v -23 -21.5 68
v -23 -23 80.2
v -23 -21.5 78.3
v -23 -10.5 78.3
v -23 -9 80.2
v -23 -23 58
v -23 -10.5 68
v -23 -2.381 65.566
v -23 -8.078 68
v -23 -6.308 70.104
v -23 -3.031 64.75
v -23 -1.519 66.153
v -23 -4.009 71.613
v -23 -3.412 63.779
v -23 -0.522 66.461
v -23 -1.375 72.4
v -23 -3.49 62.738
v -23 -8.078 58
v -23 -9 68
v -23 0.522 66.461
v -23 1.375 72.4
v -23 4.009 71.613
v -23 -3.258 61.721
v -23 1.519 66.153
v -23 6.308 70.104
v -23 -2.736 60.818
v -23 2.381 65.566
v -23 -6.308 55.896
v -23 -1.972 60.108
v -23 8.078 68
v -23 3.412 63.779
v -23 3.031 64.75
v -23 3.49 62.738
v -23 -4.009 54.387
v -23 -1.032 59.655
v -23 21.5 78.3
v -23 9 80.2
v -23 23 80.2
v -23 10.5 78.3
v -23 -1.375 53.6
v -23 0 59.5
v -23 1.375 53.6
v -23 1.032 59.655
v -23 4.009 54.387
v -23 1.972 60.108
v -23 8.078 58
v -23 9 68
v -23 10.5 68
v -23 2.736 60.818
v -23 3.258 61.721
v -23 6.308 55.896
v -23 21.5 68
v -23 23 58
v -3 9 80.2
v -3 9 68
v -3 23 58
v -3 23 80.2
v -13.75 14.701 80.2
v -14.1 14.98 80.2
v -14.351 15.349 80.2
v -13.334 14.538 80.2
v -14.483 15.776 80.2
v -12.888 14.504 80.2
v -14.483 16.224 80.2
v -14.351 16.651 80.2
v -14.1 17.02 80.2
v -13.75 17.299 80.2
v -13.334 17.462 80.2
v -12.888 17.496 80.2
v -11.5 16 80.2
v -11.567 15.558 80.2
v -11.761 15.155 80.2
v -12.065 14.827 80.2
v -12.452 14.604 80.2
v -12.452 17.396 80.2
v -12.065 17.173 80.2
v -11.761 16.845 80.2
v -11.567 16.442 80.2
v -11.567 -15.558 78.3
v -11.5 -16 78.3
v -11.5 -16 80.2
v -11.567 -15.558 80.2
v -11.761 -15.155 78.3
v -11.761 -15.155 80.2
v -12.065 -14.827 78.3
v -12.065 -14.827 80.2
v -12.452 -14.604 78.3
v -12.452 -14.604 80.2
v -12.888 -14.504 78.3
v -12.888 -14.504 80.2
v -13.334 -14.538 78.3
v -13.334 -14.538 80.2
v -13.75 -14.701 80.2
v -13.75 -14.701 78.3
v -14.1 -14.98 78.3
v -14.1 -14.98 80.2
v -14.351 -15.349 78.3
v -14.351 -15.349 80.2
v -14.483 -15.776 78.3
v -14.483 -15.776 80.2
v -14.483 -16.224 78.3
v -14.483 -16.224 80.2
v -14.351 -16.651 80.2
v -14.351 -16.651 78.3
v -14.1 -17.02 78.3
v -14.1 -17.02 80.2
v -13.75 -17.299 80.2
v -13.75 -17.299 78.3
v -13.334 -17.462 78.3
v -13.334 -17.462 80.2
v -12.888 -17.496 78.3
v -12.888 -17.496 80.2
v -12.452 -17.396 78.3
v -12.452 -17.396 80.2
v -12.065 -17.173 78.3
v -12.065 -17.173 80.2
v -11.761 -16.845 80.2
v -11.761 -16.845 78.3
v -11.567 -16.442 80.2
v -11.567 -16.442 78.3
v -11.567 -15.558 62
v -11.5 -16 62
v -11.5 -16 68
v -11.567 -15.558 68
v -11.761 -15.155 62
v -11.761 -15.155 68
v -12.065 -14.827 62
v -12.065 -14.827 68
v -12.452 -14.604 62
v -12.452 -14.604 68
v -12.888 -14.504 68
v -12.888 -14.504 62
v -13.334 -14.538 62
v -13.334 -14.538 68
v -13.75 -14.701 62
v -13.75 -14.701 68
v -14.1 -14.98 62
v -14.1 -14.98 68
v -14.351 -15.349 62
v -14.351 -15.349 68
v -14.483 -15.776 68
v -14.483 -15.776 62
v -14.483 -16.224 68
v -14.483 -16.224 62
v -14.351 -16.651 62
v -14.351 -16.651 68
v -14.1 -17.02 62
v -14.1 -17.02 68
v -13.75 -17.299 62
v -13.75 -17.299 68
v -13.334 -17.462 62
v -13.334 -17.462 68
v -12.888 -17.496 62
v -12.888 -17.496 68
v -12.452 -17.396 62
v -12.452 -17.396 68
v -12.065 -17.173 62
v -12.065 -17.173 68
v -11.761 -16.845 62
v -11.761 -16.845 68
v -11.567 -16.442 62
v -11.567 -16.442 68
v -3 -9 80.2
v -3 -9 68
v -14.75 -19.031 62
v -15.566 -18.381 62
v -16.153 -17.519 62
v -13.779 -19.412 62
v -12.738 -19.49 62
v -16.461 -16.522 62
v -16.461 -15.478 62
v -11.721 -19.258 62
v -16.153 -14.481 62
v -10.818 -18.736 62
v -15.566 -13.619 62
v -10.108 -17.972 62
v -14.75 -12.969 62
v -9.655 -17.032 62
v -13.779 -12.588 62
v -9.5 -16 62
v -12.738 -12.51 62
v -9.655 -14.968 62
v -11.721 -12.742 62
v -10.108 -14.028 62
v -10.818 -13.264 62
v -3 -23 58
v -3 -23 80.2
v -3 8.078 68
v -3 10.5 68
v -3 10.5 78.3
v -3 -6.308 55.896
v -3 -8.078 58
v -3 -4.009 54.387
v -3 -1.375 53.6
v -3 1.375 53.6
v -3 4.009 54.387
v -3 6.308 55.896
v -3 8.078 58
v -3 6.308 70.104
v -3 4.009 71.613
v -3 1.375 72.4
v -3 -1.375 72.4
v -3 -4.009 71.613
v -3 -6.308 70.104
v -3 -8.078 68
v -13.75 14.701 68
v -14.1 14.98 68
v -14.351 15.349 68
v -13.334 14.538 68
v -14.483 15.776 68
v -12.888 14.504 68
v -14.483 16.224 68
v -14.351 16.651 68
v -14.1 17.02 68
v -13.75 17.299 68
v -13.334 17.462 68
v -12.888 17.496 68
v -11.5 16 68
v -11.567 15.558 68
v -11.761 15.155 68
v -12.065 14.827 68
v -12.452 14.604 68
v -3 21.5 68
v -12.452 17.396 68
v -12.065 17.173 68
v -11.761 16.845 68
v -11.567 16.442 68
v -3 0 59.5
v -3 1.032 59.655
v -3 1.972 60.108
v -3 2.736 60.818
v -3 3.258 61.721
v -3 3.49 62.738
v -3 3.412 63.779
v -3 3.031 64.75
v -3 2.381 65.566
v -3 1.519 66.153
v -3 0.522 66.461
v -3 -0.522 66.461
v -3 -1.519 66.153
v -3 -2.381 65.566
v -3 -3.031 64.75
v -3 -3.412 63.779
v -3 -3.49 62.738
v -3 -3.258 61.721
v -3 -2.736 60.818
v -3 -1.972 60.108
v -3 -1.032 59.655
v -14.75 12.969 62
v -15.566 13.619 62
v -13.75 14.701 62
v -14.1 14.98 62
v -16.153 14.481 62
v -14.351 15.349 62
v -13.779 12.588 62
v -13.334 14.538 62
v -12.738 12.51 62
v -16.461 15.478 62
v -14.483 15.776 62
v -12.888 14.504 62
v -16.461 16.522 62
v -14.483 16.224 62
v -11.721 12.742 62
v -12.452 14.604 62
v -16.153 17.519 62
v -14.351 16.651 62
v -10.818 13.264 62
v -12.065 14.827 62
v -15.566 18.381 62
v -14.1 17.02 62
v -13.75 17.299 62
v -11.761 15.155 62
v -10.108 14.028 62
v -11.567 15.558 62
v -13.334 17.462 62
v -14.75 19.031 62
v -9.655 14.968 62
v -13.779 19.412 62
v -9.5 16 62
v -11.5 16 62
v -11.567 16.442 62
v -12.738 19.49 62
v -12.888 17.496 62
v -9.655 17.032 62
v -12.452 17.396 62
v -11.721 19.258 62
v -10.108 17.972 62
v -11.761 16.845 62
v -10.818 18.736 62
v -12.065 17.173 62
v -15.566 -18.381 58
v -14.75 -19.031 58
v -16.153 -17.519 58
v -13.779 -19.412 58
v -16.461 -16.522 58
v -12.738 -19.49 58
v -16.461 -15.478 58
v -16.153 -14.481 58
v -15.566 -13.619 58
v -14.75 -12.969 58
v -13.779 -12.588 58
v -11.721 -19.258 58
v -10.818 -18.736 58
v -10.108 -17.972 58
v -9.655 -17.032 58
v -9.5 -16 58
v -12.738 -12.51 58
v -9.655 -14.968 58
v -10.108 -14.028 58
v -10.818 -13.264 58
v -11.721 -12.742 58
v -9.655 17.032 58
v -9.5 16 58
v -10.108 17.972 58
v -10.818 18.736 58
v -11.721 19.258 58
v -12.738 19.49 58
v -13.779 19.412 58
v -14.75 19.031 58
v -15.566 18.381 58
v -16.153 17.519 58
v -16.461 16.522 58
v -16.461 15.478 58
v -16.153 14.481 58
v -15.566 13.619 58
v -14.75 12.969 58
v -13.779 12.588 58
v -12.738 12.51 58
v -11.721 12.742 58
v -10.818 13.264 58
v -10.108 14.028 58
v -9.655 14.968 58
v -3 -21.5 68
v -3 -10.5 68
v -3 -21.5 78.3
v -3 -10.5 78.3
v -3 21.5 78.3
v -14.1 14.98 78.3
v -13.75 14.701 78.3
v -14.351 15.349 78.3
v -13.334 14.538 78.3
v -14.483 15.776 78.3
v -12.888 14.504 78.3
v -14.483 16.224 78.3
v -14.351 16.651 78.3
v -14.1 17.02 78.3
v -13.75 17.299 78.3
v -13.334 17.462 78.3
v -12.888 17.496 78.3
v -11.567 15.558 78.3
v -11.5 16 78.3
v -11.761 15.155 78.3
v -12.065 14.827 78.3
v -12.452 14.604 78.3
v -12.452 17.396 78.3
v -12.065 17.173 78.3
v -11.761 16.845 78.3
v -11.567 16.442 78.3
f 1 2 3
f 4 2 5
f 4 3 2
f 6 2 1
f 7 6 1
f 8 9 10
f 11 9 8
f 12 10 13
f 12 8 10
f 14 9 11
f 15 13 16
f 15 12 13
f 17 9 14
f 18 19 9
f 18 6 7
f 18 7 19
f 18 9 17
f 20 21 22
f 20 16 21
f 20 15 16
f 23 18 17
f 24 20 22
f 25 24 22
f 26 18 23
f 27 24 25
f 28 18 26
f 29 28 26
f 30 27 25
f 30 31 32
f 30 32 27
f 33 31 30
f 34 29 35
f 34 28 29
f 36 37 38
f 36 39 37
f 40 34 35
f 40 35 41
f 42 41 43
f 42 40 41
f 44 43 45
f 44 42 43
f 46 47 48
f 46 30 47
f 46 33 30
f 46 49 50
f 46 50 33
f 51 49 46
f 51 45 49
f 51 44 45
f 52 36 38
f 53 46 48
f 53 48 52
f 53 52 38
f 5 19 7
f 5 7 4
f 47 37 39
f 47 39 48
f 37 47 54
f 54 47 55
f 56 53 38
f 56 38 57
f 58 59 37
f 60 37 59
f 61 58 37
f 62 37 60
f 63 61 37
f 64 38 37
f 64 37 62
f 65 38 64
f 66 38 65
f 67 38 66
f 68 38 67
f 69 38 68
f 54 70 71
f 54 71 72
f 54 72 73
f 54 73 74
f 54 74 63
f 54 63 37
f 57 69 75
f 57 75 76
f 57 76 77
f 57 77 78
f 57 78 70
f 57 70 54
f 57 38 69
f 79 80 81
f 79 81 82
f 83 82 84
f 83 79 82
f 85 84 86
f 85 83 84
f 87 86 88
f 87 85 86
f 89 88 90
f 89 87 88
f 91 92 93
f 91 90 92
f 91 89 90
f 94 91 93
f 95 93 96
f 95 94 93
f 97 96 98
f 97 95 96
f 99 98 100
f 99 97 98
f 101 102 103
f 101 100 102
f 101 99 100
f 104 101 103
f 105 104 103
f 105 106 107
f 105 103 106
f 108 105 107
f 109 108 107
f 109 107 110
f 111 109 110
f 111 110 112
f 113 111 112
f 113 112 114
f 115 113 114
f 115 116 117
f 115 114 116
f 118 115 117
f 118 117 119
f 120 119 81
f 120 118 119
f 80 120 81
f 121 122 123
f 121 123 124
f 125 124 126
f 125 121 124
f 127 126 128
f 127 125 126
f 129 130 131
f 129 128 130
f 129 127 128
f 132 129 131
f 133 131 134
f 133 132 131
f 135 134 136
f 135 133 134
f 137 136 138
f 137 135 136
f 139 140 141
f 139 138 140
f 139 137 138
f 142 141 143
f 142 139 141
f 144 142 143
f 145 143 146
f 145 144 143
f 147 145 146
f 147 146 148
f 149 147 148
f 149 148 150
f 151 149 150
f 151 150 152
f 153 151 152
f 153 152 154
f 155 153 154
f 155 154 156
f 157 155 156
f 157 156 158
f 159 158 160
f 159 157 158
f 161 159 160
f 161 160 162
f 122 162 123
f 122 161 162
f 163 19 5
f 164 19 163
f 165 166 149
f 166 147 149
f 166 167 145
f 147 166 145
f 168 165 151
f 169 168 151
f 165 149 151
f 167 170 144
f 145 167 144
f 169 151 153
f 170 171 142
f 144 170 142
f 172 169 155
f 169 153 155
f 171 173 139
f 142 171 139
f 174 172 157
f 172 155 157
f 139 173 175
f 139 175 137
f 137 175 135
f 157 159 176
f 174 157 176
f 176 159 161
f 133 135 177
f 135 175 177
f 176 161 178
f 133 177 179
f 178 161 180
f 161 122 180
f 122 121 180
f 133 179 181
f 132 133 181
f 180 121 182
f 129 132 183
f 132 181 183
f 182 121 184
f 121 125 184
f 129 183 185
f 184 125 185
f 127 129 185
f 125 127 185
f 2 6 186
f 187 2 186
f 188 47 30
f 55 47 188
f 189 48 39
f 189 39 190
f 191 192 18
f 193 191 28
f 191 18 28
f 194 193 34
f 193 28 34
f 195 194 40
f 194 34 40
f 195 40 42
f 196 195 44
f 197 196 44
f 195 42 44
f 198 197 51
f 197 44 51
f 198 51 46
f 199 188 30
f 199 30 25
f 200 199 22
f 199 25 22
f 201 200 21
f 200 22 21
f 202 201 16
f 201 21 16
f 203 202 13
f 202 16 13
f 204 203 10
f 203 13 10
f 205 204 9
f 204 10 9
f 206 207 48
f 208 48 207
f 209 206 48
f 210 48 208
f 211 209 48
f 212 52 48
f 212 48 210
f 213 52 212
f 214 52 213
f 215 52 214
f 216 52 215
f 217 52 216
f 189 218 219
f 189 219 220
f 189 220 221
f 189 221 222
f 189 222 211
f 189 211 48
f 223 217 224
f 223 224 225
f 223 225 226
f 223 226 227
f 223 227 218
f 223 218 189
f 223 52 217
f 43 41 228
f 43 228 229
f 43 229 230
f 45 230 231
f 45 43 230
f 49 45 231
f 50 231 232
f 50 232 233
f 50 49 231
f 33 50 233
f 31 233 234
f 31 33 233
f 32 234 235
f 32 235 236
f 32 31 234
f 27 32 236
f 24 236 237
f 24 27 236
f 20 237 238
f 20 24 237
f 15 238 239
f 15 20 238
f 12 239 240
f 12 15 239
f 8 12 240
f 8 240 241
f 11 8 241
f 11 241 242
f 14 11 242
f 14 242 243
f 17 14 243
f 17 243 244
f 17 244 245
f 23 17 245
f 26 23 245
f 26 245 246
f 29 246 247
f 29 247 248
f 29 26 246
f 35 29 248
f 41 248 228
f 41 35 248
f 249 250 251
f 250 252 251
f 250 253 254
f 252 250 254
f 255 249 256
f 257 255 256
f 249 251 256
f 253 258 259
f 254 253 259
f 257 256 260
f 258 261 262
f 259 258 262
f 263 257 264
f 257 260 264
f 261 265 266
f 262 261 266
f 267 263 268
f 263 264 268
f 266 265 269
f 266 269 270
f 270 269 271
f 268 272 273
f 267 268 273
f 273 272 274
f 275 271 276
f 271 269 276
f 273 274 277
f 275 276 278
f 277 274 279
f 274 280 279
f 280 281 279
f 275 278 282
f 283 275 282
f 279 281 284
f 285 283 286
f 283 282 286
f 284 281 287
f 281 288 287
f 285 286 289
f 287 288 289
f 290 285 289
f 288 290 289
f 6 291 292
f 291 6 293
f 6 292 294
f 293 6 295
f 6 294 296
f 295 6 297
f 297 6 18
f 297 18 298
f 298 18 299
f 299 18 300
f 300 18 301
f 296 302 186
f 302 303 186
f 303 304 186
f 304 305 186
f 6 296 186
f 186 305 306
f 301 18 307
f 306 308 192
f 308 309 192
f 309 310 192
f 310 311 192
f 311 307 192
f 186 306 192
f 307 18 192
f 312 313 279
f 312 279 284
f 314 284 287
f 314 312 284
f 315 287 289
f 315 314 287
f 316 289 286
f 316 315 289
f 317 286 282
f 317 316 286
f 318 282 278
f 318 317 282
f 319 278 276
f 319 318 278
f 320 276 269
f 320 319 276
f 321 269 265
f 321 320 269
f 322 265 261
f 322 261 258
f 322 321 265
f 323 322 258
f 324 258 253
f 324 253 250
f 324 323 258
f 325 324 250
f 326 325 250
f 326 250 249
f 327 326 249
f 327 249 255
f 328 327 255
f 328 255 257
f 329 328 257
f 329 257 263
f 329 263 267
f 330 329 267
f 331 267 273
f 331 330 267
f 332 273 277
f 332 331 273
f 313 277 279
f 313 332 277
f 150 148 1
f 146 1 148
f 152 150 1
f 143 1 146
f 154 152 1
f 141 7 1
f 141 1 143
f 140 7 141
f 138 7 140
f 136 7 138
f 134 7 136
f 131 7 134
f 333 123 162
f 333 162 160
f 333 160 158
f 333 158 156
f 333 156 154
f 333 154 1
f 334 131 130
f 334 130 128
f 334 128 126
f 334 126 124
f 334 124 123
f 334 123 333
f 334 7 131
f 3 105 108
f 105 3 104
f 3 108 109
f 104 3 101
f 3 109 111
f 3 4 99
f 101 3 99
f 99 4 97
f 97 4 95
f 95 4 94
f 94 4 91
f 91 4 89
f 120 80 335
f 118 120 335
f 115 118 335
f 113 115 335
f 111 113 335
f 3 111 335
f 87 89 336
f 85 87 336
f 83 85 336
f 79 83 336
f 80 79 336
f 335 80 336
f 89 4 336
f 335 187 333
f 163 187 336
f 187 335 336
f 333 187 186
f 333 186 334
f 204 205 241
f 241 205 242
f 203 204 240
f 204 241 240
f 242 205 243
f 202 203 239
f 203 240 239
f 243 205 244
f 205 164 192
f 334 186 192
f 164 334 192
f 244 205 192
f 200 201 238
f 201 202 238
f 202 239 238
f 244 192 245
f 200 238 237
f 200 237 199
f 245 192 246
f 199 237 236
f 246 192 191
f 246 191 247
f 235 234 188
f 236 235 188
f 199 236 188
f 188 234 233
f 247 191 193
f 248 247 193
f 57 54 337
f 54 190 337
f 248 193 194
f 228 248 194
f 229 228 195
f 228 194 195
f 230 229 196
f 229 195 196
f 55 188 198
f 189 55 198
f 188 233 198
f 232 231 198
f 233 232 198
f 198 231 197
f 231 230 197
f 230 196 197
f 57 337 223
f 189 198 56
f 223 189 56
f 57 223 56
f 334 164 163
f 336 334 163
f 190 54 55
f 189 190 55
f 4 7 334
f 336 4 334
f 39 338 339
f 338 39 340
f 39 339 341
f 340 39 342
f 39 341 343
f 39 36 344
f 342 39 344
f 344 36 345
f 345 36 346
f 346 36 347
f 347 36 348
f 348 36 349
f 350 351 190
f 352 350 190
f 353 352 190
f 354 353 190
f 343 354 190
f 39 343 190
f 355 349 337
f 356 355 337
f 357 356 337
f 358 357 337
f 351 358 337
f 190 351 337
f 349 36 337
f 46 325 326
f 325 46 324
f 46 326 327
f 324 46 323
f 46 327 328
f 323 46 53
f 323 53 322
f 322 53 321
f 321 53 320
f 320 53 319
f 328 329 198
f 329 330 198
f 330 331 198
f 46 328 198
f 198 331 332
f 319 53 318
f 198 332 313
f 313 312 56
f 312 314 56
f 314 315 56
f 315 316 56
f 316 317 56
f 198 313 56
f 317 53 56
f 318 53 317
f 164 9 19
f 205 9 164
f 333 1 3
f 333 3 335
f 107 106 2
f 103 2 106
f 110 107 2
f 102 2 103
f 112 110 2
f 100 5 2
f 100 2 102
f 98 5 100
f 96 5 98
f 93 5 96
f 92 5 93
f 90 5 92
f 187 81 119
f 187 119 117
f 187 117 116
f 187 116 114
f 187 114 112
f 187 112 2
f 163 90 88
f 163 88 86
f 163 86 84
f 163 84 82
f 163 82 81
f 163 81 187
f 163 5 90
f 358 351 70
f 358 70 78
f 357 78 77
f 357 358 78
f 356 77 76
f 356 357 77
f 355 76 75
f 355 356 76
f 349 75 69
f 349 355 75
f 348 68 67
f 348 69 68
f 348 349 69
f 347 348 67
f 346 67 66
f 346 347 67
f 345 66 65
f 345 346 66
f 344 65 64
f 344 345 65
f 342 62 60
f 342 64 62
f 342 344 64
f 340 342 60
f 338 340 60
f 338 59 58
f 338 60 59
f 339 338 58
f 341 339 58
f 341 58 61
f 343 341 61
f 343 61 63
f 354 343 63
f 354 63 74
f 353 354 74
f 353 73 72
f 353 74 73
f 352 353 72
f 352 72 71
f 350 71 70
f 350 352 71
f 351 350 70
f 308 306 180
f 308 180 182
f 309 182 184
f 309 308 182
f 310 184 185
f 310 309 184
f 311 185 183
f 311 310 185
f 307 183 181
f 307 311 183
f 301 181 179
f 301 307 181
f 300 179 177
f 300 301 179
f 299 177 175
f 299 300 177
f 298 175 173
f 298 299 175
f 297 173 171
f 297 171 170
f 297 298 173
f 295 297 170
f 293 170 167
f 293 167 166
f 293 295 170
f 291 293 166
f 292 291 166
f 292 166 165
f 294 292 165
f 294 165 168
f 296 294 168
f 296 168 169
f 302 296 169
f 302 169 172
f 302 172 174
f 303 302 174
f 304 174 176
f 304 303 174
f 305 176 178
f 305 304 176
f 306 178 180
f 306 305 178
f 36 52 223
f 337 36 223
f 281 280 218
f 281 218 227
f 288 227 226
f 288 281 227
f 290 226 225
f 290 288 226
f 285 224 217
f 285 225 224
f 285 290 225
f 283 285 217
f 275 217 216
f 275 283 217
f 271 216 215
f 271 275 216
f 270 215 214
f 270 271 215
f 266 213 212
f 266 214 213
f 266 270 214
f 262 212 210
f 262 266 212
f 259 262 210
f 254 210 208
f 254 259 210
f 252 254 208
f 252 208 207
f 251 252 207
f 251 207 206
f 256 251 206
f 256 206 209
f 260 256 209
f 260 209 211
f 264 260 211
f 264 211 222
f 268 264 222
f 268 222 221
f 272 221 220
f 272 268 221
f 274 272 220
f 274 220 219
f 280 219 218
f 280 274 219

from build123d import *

# Parameters (mm, degrees)
CYLINDER097_R     = 3.5
CYLINDER097_DEPTH = 4
CYLINDER098_R     = 1.5
CYLINDER098_DEPTH = 25
CYLINDER096_R     = 3.5
CYLINDER096_DEPTH = 4
CYLINDER095_R     = 1.5
CYLINDER095_DEPTH = 25
CYLINDER093_R     = 3.5
CYLINDER093_DEPTH = 20
BOX030_W          = 20
BOX030_H          = 11
BOX030_DEPTH      = 10.3
BOX029_W          = 20
BOX029_H          = 11
BOX029_DEPTH      = 10.3
BOX027_W          = 20
BOX027_H          = 14
BOX027_DEPTH      = 12.2
BOX028_W          = 20
BOX028_H          = 14
BOX028_DEPTH      = 12.2
BOX026_W          = 20
BOX026_H          = 46
BOX026_DEPTH      = 10
CYLINDER094_R     = 9.5
CYLINDER094_DEPTH = 20


with BuildPart() as zylinder094:
    # Cylinder097 → Cylinder097 (new body)
    with BuildSketch(Plane.XY):
        Circle(CYLINDER097_R)
    extrude(amount=CYLINDER097_DEPTH)


with BuildPart() as fusion034:
    # Cylinder098 → Cylinder098 (new body)
    with BuildSketch(Plane.XY):
        Circle(CYLINDER098_R)
    extrude(amount=CYLINDER098_DEPTH)

    # Fusion034: union Zylinder094
    add(zylinder094.part)


with BuildPart() as fusion034_1:
    # Fusion034 placement: moved
    add(fusion034.part.moved(Location((-13, 16, 58))))


with BuildPart() as zylinder093:
    # Cylinder096 → Cylinder096 (new body)
    with BuildSketch(Plane.XY):
        Circle(CYLINDER096_R)
    extrude(amount=CYLINDER096_DEPTH)


with BuildPart() as fusion035:
    # Cylinder095 → Cylinder095 (new body)
    with BuildSketch(Plane.XY):
        Circle(CYLINDER095_R)
    extrude(amount=CYLINDER095_DEPTH)

    # Fusion033: union Zylinder093
    add(zylinder093.part)


with BuildPart() as fusion035_1:
    # Fusion033 placement: moved
    add(fusion035.part.moved(Location((-13, -16, 58))))

    # Fusion035: union Fusion034
    add(fusion034_1.part)


with BuildPart() as zylinder090:
    # Cylinder093 → Cylinder093 (new body)
    with BuildSketch(Plane(origin=(-23, 0, 63), x_dir=(0, 0, -1), z_dir=(1, 0, 0))):
        Circle(CYLINDER093_R)
    extrude(amount=CYLINDER093_DEPTH)


with BuildPart() as w_rfel030:
    # Box030 → Box030 (new body)
    with BuildSketch(Plane(origin=(-23, -21.5, 68), x_dir=(1, 0, 0), z_dir=(0, 0, 1))):
        with Locations((10, 5.5)):
            Rectangle(BOX030_W, BOX030_H)
    extrude(amount=BOX030_DEPTH)


with BuildPart() as fusion030:
    # Box029 → Box029 (new body)
    with BuildSketch(Plane(origin=(-23, 10.5, 68), x_dir=(1, 0, 0), z_dir=(0, 0, 1))):
        with Locations((10, 5.5)):
            Rectangle(BOX029_W, BOX029_H)
    extrude(amount=BOX029_DEPTH)

    # Fusion030: union Würfel030
    add(w_rfel030.part)


with BuildPart() as w_rfel027:
    # Box027 → Box027 (new body)
    with BuildSketch(Plane(origin=(-23, 9, 68), x_dir=(1, 0, 0), z_dir=(0, 0, 1))):
        with Locations((10, 7)):
            Rectangle(BOX027_W, BOX027_H)
    extrude(amount=BOX027_DEPTH)


with BuildPart() as cut047:
    # Box028 → Box028 (new body)
    with BuildSketch(Plane(origin=(-23, -23, 68), x_dir=(1, 0, 0), z_dir=(0, 0, 1))):
        with Locations((10, 7)):
            Rectangle(BOX028_W, BOX028_H)
    extrude(amount=BOX028_DEPTH)

    # Fusion029: union Würfel027
    add(w_rfel027.part)

    # Cut047: cut Fusion030
    add(fusion030.part, mode=Mode.SUBTRACT)


with BuildPart() as fusion031:
    # Box026 → Box026 (new body)
    with BuildSketch(Plane(origin=(-23, -23, 58), x_dir=(1, 0, 0), z_dir=(0, 0, 1))):
        with Locations((10, 23)):
            Rectangle(BOX026_W, BOX026_H)
    extrude(amount=BOX026_DEPTH)

    # Fusion031: union Cut047
    add(cut047.part)


with BuildPart() as belt_tensioner:
    # Cylinder094 → Cylinder094 (new body)
    with BuildSketch(Plane(origin=(-23, 0, 63), x_dir=(0, 0, -1), z_dir=(1, 0, 0))):
        Circle(CYLINDER094_R)
    extrude(amount=CYLINDER094_DEPTH)

    # Fusion032: union Fusion031
    add(fusion031.part)

    # Cut048: cut Zylinder090
    add(zylinder090.part, mode=Mode.SUBTRACT)

    # Cut049: cut Fusion035
    add(fusion035_1.part, mode=Mode.SUBTRACT)


solid = belt_tensioner.part
